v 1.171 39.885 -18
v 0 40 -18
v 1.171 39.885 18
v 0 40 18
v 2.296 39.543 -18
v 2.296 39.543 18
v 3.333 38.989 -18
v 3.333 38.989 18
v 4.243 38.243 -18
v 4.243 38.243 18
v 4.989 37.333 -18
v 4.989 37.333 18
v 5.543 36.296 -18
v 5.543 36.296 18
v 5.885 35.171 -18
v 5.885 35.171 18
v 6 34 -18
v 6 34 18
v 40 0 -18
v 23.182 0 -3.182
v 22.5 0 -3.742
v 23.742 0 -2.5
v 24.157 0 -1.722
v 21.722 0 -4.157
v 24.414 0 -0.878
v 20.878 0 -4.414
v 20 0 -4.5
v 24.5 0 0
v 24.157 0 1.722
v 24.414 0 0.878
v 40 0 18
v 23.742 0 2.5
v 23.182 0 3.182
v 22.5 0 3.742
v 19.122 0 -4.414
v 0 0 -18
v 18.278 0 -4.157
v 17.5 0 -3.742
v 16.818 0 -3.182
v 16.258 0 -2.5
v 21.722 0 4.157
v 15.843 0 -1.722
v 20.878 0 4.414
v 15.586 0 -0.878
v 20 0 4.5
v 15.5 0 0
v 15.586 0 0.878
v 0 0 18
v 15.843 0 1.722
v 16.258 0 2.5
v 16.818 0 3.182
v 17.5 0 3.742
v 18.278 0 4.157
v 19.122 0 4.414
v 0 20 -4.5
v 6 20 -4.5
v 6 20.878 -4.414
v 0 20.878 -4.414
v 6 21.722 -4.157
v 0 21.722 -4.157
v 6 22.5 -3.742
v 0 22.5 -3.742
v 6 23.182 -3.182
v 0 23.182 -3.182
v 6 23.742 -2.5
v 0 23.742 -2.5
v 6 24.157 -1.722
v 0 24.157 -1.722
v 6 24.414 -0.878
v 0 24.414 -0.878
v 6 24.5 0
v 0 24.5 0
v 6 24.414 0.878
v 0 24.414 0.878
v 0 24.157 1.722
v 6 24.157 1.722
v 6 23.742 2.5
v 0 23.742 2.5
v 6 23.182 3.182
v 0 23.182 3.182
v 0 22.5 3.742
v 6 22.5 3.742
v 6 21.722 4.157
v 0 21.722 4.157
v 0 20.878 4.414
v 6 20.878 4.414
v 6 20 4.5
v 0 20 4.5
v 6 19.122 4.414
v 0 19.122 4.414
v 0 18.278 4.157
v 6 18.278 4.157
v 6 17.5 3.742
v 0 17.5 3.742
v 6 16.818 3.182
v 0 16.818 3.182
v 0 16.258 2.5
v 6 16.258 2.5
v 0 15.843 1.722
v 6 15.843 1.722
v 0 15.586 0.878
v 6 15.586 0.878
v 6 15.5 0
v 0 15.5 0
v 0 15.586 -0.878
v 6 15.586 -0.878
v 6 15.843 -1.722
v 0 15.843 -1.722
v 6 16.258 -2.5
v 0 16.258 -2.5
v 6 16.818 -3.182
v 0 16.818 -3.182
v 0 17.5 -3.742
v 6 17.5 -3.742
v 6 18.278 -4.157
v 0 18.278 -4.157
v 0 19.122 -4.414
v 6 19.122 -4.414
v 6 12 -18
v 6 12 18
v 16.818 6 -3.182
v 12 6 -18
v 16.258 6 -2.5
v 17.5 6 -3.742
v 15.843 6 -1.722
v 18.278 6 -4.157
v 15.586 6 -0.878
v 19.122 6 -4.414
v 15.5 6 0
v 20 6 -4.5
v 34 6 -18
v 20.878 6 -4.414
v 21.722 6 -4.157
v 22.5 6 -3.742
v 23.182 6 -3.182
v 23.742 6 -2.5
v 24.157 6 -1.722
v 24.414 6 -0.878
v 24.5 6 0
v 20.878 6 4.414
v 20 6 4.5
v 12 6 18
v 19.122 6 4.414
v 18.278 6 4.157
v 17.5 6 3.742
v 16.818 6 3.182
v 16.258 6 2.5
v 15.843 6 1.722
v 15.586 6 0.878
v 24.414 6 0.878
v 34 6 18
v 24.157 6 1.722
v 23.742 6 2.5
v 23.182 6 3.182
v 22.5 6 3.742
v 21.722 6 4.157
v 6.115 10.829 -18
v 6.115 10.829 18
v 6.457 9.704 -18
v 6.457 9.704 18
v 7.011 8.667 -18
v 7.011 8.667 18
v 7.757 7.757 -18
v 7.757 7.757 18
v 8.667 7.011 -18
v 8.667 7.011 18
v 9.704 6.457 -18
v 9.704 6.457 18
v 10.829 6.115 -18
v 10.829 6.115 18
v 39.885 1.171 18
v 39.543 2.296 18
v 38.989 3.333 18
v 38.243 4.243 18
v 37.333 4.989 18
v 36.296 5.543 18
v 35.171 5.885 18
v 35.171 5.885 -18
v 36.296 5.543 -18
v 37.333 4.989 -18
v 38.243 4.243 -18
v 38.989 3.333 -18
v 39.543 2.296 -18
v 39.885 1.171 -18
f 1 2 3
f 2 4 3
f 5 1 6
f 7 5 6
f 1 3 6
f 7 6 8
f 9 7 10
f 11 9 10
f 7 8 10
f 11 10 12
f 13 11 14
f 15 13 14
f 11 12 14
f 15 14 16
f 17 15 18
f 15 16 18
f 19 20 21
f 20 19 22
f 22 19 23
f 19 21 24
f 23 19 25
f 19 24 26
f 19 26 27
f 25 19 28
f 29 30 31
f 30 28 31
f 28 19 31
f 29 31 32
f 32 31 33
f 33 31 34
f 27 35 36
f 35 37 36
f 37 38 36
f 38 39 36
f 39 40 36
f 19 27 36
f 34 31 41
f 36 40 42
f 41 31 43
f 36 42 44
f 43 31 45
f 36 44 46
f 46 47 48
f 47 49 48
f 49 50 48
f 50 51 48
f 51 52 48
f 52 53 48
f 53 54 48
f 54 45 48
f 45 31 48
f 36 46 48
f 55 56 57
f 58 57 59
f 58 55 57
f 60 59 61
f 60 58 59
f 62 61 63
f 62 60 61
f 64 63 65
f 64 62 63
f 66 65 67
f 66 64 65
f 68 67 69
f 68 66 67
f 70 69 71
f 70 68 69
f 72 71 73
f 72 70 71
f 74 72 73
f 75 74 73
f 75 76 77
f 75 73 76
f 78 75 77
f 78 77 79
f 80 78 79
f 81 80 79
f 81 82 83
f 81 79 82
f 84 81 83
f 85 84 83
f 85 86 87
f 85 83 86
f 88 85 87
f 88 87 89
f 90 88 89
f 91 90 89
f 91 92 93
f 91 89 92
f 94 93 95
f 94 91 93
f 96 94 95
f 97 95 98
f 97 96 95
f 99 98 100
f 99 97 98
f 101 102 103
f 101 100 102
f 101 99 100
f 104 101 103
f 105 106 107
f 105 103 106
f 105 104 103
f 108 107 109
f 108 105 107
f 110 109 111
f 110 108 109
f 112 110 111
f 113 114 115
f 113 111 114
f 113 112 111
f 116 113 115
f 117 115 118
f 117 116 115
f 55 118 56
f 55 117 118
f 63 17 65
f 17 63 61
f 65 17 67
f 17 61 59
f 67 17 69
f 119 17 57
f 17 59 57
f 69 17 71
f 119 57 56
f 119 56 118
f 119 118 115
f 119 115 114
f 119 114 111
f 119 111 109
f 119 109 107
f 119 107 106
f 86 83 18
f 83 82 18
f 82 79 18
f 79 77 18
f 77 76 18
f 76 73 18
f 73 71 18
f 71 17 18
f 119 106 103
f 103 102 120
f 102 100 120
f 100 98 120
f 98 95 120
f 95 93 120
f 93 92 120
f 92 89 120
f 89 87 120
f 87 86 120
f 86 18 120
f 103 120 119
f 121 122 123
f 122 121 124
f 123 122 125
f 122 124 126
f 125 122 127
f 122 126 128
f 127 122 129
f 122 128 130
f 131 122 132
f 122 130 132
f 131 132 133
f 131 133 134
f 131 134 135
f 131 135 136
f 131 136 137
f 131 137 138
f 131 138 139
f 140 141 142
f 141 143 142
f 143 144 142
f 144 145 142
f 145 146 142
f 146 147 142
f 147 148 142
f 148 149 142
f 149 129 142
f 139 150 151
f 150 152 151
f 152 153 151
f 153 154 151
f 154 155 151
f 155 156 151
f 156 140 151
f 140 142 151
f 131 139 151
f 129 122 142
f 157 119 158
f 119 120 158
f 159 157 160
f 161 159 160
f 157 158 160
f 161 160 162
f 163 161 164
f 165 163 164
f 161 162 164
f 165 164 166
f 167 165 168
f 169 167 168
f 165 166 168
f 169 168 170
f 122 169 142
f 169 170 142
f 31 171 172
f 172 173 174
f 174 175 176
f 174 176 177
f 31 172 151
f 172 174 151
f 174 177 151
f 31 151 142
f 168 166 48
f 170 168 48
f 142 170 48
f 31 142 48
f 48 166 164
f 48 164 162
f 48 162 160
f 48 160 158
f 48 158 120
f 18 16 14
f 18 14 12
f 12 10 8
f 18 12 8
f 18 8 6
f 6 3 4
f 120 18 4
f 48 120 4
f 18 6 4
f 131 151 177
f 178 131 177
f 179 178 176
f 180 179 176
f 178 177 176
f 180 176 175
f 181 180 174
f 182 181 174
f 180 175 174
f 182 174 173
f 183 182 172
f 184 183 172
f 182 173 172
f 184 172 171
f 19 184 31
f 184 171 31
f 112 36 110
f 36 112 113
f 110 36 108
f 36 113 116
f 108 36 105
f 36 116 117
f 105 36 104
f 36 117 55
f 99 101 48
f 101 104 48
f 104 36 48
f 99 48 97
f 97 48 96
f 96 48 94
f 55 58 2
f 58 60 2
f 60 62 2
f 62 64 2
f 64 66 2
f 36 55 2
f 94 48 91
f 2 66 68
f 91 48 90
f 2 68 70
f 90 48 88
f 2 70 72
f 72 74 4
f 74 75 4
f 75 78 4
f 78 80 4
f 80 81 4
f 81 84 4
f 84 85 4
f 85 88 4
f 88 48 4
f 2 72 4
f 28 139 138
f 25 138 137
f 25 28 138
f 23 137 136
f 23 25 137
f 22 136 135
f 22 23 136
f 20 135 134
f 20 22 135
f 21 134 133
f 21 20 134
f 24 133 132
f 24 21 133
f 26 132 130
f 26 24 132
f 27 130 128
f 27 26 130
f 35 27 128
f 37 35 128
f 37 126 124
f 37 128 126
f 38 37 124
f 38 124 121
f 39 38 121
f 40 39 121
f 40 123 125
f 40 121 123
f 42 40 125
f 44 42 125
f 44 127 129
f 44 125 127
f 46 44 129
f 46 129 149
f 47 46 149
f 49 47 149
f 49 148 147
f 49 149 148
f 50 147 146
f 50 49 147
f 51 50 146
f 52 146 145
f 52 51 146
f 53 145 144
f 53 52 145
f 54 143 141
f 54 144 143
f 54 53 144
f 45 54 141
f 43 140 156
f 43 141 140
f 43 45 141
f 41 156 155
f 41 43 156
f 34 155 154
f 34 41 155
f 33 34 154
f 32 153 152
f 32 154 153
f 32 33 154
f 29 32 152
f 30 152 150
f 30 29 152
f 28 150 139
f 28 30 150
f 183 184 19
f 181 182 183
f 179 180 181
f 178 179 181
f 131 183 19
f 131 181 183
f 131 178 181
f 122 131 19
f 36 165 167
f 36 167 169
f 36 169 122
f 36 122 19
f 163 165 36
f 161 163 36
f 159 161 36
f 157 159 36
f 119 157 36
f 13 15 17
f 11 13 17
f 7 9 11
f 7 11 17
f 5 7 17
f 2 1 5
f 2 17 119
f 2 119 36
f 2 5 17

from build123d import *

# Parameters (mm, degrees)
BOSS_EXTRUDE1_DEPTH = 18
SKETCH2_R           = 4.5
CUT_EXTRUDE1_DEPTH  = 41
SKETCH3_R           = 4.5
CUT_EXTRUDE2_DEPTH  = 41


with BuildPart() as part:
    # Sketch1 → Boss-Extrude1 (new body, symmetric)
    with BuildSketch(Plane.XY):
        with BuildLine():
            Line((0, 0), (0, 40))
            ThreePointArc((0, 40), (4.242640687, 38.242640687), (6, 34))
            Line((6, 34), (6, 12))
            ThreePointArc((6, 12), (7.757359313, 7.757359313), (12, 6))
            Line((12, 6), (34, 6))
            ThreePointArc((34, 6), (38.242640687, 4.242640687), (40, 0))
            Line((40, 0), (0, 0))
        make_face()
    extrude(amount=BOSS_EXTRUDE1_DEPTH, both=True)

    # Sketch2 → Cut-Extrude1 (cut, through all)
    with BuildSketch(Plane(origin=(0, 0, 0), x_dir=(1, 0, 0), z_dir=(0, 1, 0))):
        with Locations((20, 0)):
            Circle(SKETCH2_R)
    extrude(amount=CUT_EXTRUDE1_DEPTH, mode=Mode.SUBTRACT)

    # Sketch3 → Cut-Extrude2 (cut, through all)
    with BuildSketch(Plane(origin=(0, 0, 0), x_dir=(0, 0, -1), z_dir=(1, 0, 0))):
        with Locations((0, 20)):
            Circle(SKETCH3_R)
    extrude(amount=CUT_EXTRUDE2_DEPTH, mode=Mode.SUBTRACT)


solid = part.part
